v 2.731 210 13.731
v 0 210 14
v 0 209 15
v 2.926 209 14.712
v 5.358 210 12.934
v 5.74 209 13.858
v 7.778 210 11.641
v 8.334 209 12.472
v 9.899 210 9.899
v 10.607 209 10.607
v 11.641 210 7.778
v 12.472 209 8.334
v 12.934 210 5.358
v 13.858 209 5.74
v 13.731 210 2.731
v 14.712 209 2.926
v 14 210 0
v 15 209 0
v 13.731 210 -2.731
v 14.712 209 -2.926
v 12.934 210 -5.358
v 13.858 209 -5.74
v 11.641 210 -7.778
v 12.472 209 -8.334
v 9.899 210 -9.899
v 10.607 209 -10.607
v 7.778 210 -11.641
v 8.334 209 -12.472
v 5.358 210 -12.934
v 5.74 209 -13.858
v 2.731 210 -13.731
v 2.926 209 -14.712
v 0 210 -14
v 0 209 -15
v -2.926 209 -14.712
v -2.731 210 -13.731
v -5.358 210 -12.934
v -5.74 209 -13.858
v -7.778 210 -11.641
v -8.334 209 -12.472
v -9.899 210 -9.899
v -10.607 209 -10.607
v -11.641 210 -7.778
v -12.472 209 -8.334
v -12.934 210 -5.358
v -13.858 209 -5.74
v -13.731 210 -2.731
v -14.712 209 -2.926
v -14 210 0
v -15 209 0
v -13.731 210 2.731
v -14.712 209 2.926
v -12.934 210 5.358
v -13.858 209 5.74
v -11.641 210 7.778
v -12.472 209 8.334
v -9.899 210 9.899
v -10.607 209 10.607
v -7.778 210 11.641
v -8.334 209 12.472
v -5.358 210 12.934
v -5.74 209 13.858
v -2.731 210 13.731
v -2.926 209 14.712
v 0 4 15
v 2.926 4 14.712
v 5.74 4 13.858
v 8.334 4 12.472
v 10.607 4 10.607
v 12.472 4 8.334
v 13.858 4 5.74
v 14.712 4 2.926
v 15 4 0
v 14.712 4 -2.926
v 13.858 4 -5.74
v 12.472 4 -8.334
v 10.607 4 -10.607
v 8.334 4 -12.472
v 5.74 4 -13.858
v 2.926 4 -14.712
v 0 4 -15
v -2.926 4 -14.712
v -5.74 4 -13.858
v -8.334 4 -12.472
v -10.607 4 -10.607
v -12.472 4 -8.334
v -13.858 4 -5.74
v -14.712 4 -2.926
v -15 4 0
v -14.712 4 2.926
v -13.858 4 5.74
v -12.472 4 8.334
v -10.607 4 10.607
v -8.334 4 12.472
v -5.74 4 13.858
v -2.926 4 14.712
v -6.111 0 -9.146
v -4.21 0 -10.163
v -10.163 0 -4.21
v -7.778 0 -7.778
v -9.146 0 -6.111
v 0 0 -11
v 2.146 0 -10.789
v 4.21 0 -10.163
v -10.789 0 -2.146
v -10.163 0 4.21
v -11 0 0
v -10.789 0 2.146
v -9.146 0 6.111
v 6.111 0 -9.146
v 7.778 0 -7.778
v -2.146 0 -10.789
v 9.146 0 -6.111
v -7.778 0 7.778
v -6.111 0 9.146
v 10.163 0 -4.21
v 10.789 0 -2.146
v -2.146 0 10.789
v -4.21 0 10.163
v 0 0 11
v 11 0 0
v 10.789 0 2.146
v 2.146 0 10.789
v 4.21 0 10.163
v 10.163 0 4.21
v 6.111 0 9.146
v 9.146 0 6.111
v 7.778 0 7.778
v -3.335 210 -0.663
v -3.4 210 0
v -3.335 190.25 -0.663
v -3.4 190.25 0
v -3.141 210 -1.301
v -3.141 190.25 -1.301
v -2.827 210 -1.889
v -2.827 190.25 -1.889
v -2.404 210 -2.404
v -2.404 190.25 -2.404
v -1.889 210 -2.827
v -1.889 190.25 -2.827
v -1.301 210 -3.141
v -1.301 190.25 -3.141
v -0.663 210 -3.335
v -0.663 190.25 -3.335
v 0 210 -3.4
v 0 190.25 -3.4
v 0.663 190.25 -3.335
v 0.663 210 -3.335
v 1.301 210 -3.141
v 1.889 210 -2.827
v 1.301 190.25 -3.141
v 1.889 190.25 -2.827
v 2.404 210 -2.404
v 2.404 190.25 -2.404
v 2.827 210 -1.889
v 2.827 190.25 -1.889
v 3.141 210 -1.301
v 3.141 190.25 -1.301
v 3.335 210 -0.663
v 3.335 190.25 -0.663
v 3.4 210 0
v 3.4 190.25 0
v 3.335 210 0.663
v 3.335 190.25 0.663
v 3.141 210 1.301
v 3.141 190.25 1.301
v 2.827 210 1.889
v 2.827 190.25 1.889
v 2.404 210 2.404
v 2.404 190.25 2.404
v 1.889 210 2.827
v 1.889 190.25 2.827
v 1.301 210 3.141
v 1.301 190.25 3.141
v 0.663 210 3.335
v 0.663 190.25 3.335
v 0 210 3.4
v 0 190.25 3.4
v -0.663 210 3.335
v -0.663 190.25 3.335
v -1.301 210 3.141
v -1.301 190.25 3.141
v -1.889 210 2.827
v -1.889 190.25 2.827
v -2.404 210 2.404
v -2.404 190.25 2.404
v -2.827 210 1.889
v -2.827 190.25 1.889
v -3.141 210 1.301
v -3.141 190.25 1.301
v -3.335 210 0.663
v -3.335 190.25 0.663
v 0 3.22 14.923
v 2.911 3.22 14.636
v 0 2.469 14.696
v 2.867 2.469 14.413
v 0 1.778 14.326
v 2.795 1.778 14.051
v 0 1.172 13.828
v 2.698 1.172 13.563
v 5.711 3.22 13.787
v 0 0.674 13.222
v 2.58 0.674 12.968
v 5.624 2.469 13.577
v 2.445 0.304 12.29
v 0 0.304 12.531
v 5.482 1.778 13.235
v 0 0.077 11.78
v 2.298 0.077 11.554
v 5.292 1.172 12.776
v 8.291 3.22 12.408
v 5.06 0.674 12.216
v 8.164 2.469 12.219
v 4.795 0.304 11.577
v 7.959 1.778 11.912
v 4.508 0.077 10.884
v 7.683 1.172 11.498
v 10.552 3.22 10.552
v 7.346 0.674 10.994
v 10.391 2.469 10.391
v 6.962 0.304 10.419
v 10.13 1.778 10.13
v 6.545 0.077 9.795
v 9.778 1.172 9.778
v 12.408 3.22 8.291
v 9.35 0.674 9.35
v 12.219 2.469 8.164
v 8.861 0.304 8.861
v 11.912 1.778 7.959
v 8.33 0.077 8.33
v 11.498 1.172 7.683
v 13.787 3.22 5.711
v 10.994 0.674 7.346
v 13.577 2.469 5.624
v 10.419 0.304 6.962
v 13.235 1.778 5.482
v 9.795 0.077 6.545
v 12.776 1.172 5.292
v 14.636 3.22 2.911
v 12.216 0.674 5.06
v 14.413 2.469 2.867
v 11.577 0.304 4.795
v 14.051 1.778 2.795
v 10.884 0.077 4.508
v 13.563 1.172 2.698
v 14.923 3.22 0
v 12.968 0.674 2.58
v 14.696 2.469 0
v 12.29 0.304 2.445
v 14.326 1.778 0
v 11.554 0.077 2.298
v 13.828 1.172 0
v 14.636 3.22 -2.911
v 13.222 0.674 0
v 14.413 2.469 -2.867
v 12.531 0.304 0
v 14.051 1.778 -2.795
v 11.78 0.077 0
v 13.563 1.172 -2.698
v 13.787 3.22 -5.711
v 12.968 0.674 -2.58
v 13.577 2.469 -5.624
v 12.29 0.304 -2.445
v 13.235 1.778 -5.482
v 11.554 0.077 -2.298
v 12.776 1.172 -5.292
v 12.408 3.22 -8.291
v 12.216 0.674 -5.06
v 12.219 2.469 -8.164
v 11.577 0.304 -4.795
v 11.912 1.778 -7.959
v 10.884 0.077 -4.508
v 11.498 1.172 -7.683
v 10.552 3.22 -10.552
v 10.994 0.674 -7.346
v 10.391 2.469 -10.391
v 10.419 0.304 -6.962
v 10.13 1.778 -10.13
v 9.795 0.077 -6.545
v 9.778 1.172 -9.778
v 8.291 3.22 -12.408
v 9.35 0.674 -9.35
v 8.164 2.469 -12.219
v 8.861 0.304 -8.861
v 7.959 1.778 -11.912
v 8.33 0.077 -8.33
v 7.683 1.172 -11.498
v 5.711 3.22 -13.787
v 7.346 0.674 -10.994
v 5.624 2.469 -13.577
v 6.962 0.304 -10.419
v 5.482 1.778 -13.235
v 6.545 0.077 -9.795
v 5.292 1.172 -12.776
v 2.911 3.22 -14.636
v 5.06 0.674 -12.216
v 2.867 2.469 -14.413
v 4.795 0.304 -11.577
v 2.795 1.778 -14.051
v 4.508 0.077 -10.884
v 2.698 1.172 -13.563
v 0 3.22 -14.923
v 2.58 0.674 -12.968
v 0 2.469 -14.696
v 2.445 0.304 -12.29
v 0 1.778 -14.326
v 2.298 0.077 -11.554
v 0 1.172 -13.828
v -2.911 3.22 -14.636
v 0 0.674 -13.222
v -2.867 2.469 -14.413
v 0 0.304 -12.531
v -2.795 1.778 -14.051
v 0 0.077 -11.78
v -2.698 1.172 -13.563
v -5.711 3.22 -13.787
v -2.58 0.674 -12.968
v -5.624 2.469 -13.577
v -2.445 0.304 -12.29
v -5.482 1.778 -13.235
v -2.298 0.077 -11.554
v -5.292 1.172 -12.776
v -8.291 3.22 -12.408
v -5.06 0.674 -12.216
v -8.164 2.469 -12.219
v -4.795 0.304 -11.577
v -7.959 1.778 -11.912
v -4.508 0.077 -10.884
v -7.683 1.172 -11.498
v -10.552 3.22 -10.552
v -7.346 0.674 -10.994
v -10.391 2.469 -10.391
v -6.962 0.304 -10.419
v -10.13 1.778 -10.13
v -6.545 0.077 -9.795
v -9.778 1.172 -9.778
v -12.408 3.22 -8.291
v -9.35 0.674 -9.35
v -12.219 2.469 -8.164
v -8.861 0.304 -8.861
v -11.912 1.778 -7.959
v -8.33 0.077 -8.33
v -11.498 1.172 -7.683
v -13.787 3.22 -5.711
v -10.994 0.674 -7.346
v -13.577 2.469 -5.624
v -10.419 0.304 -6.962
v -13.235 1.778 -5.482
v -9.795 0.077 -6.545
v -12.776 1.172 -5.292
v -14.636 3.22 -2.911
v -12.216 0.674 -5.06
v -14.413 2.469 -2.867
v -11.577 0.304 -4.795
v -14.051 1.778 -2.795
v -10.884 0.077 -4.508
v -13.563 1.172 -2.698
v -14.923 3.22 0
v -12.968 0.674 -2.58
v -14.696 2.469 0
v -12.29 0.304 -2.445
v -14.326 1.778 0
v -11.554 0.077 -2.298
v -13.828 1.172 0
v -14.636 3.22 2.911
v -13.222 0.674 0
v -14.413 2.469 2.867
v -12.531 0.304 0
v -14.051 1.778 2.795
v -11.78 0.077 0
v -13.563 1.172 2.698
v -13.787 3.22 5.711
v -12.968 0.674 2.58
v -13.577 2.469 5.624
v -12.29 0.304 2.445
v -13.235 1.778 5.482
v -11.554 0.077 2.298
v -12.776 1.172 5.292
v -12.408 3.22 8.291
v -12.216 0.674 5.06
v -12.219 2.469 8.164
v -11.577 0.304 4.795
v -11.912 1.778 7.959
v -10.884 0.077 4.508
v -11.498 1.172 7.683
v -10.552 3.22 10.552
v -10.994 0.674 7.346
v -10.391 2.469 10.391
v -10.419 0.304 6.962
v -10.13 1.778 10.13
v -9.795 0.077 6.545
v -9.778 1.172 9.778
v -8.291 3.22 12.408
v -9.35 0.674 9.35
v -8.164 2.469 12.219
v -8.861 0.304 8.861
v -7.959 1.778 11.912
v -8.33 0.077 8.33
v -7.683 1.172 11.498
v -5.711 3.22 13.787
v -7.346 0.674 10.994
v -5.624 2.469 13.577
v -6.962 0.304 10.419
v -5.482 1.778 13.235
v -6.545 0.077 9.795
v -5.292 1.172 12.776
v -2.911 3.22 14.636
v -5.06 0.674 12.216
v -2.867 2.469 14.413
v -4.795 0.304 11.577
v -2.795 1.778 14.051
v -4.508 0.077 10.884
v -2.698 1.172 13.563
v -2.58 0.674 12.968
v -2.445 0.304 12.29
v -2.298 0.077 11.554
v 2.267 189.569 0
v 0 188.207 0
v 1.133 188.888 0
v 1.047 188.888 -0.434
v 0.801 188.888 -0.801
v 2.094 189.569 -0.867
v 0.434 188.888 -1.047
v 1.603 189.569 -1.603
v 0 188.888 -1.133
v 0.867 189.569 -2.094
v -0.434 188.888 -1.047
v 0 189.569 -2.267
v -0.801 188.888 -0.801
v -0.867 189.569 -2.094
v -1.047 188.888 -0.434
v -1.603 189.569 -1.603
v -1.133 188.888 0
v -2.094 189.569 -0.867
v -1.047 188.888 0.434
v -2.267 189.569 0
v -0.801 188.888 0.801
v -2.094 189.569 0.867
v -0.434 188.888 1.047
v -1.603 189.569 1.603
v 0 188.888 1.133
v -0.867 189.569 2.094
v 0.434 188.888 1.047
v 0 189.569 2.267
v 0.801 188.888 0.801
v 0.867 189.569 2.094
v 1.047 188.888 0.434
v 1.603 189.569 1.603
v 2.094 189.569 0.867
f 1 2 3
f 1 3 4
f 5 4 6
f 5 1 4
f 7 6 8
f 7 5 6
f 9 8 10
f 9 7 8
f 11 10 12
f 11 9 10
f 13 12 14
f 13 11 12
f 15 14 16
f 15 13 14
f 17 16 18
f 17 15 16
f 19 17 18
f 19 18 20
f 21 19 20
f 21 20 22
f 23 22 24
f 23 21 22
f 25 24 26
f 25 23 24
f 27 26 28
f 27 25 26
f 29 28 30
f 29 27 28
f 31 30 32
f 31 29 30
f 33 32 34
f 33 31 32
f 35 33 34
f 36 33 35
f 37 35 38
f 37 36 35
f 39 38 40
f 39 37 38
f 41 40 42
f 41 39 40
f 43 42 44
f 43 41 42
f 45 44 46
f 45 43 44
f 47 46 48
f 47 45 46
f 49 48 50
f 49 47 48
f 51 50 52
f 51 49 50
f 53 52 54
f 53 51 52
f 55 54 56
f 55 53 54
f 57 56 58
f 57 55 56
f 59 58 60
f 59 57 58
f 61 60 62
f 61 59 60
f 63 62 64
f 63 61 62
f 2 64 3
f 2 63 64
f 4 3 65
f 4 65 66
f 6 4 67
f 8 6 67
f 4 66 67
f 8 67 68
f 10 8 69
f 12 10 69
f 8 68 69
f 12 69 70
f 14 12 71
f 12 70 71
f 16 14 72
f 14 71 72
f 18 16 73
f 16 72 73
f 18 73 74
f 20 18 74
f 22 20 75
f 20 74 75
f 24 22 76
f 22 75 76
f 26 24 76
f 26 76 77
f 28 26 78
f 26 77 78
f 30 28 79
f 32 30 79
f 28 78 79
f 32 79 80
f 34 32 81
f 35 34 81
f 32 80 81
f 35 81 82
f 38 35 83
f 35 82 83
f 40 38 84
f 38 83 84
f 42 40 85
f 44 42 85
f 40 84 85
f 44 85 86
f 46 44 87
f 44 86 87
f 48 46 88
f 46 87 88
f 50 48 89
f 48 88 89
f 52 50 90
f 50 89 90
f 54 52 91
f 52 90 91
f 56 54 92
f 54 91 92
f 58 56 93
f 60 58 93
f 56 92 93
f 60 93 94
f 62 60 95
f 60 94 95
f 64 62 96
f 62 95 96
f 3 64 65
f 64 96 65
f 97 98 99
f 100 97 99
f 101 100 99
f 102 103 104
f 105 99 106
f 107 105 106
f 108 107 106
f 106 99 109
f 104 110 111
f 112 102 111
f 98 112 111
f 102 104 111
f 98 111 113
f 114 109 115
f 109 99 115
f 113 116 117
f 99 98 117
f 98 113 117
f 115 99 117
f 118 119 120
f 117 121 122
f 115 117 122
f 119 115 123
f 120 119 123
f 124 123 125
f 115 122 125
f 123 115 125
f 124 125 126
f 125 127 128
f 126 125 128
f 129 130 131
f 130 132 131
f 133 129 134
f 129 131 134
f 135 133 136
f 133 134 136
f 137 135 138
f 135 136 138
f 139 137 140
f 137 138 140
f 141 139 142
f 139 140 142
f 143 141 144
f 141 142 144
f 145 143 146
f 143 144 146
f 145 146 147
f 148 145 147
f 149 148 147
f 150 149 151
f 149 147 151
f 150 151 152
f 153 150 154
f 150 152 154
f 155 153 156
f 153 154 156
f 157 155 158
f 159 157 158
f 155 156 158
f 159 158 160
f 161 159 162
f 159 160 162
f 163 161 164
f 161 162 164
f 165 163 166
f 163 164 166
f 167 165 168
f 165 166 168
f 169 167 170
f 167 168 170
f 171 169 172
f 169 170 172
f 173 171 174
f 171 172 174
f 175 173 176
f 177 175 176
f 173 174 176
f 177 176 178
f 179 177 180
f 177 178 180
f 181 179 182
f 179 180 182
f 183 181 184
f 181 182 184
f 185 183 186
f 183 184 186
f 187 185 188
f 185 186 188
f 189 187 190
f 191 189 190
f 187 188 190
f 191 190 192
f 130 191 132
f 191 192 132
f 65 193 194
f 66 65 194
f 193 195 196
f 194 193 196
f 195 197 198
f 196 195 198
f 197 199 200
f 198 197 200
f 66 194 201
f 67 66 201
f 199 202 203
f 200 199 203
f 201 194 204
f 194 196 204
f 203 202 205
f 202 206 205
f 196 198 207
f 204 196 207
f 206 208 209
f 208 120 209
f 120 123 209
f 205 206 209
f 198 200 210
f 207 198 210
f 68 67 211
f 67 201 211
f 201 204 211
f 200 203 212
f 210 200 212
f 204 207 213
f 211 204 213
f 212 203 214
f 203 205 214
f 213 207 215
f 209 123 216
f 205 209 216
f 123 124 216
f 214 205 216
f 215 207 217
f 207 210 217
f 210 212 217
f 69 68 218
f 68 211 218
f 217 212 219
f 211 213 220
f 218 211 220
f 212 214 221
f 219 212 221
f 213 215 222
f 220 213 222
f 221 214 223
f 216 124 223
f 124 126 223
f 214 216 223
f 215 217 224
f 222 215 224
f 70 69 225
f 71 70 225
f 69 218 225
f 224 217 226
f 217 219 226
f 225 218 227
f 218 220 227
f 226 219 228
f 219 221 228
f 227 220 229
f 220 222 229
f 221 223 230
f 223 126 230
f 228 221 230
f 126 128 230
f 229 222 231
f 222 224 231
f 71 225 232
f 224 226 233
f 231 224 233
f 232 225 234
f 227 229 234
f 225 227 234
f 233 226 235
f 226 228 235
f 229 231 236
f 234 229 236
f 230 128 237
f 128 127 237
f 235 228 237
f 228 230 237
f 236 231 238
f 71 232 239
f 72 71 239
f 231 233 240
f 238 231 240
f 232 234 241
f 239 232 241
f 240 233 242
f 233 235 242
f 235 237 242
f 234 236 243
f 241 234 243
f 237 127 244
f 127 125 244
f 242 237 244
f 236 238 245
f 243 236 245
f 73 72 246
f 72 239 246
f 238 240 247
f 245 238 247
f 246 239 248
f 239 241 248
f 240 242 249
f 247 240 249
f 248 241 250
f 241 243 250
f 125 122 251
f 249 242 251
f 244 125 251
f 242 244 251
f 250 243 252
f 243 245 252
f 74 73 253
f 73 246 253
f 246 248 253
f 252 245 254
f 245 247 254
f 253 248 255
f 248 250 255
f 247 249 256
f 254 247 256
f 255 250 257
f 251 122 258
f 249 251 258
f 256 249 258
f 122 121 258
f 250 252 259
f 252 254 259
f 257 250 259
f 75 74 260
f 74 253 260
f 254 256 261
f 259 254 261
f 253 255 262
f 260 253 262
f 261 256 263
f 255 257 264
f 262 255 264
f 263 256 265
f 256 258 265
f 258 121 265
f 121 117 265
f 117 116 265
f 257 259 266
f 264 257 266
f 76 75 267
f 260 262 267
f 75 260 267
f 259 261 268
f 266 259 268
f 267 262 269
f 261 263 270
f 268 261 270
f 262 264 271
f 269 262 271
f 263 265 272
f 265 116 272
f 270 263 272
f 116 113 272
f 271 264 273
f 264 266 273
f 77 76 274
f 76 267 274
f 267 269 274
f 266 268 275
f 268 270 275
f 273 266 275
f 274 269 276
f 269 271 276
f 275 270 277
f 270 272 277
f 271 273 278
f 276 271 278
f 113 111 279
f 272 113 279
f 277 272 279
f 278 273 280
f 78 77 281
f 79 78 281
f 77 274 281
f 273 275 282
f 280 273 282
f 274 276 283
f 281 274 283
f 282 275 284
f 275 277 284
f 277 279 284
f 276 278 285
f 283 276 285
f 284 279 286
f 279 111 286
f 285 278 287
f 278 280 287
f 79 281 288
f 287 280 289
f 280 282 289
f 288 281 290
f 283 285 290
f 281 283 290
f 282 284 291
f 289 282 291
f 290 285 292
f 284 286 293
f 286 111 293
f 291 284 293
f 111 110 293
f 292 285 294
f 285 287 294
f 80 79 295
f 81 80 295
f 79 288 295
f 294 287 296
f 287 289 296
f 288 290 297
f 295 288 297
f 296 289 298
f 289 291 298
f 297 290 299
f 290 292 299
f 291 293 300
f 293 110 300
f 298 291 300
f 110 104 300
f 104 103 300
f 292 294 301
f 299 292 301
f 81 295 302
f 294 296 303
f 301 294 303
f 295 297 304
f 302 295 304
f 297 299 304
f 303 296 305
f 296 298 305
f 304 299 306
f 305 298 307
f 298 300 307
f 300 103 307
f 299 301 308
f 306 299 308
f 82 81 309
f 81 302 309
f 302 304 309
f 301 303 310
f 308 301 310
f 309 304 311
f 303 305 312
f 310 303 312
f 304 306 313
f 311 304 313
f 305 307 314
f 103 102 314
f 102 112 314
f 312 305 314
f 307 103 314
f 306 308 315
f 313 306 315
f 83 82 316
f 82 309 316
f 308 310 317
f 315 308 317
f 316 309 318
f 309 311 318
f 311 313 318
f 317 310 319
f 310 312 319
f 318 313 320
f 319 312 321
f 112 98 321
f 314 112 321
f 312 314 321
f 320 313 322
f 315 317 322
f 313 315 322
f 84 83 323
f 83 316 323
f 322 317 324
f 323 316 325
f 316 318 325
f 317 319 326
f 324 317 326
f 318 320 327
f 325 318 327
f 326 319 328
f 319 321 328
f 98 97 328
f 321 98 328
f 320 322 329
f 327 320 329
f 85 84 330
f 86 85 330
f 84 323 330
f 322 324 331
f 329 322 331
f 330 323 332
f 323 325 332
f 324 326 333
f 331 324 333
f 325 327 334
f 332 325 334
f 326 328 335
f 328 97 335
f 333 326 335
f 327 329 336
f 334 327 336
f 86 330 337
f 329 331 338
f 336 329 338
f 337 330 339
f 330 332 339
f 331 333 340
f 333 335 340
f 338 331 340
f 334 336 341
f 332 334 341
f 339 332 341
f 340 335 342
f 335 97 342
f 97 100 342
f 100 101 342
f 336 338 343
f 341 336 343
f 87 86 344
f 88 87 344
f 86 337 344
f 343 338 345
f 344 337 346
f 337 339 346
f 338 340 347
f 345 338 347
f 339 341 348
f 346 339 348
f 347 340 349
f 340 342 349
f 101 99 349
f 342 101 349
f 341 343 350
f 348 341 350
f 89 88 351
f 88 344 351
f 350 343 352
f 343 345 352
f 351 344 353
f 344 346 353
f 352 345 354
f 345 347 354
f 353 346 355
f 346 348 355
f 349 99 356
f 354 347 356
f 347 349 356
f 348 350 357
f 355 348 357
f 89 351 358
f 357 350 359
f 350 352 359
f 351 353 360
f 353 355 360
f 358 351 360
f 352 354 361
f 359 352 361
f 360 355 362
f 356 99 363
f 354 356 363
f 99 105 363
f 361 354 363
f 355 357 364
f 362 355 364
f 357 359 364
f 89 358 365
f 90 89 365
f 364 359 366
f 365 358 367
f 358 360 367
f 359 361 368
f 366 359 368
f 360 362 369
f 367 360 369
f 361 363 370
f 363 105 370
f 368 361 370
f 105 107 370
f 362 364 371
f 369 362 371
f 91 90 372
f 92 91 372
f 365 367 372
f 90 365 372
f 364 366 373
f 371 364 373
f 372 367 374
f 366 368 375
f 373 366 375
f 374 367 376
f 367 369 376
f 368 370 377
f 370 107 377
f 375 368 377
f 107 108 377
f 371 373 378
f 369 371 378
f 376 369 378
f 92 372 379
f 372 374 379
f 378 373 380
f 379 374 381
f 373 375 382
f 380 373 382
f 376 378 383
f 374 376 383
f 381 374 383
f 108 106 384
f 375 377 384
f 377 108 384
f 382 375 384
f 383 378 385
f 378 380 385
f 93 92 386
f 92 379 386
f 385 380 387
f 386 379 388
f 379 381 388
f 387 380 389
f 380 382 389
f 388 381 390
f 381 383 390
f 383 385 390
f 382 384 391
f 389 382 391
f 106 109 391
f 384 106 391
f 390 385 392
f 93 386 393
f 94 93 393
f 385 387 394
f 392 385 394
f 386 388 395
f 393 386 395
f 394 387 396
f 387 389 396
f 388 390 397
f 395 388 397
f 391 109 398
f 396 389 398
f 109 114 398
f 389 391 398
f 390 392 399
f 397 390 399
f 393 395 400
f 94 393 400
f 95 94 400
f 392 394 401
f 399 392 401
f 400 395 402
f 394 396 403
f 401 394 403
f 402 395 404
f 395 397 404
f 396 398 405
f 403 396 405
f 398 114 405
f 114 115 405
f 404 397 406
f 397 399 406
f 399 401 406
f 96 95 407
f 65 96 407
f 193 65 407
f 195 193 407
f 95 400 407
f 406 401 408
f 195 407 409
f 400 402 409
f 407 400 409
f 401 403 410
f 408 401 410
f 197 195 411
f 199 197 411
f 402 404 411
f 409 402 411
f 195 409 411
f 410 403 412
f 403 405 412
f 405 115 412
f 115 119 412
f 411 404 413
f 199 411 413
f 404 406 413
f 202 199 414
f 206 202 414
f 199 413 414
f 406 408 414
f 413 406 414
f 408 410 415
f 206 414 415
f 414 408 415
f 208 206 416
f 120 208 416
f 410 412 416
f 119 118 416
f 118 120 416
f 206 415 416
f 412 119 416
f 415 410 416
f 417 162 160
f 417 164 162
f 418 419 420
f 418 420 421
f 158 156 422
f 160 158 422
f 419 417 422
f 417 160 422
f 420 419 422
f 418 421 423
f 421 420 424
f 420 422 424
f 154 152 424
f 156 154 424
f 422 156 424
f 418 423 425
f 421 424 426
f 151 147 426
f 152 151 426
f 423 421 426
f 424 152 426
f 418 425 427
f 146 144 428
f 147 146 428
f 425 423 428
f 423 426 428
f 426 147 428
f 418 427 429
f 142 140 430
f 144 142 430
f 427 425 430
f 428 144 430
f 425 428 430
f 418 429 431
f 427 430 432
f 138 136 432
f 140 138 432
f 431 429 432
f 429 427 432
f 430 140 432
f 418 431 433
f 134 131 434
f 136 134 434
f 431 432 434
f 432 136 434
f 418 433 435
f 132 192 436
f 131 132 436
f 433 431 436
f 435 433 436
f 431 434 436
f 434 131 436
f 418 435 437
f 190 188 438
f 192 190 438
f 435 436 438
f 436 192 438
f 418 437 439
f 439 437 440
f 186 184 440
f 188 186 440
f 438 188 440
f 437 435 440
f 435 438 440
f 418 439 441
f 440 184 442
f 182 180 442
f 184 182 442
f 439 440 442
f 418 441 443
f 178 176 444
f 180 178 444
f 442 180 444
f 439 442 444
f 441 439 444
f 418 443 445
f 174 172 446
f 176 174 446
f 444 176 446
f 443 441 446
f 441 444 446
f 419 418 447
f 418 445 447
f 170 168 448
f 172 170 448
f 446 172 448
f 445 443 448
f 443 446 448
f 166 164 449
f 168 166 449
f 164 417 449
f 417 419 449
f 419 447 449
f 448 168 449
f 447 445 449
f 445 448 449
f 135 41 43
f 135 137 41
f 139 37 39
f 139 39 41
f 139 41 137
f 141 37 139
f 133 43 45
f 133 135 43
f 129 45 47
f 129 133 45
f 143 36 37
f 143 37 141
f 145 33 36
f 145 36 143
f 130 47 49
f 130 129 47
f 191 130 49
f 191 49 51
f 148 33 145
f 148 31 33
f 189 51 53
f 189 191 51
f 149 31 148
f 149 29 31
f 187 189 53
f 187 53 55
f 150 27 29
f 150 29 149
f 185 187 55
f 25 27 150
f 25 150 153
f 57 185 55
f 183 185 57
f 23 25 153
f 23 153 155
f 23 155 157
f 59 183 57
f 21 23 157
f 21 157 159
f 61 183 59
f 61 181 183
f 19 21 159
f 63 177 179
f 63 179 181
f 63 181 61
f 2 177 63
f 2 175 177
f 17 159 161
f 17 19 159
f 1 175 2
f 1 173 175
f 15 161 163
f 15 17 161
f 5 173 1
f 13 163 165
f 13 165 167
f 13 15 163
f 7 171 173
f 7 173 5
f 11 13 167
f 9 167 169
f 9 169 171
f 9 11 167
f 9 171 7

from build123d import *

# Parameters (mm, degrees)
SKETCH1_R                  = 15
BOSS_EXTRUDE1_DEPTH        = 210
FILLET1_R                  = 4
CHAMFER1_SIZE              = 1
M8X1_25_TAPPED_HOLE1_D     = 6.8
M8X1_25_TAPPED_HOLE1_DEPTH = 19.75
M8X1_25_TAPPED_HOLE1_TIP   = 2.042926105


with BuildPart() as part:
    # Sketch1 → Boss-Extrude1 (new body)
    with BuildSketch(Plane(origin=(0, 0, 0), x_dir=(1, 0, 0), z_dir=(0, 1, 0))):
        with Locations(Location((0, 0, 0), (0, 0, 270))):
            Circle(SKETCH1_R)
    extrude(amount=BOSS_EXTRUDE1_DEPTH)

    # Fillet1
    fillet1_edges = [part.edges().sort_by_distance(p)[0] for p in [
        (0, 0, -15),
    ]]
    fillet(fillet1_edges, radius=FILLET1_R)

    # Chamfer1
    chamfer1_edges = [part.edges().sort_by_distance(p)[0] for p in [
        (0, 210, -15),
    ]]
    chamfer(chamfer1_edges, length=CHAMFER1_SIZE)

    # M8x1.25 Tapped Hole1
    with Locations(Plane(origin=(0, 210, 0), x_dir=(1, 0, 0), z_dir=(0, 1, 0))):
        with Locations((0, 0)):
            Hole(M8X1_25_TAPPED_HOLE1_D / 2, depth=M8X1_25_TAPPED_HOLE1_DEPTH)
            with Locations((0, 0, -(M8X1_25_TAPPED_HOLE1_DEPTH + M8X1_25_TAPPED_HOLE1_TIP / 2))):  # 118° drill point
                Cone(0, M8X1_25_TAPPED_HOLE1_D / 2, M8X1_25_TAPPED_HOLE1_TIP, mode=Mode.SUBTRACT)


solid = part.part
